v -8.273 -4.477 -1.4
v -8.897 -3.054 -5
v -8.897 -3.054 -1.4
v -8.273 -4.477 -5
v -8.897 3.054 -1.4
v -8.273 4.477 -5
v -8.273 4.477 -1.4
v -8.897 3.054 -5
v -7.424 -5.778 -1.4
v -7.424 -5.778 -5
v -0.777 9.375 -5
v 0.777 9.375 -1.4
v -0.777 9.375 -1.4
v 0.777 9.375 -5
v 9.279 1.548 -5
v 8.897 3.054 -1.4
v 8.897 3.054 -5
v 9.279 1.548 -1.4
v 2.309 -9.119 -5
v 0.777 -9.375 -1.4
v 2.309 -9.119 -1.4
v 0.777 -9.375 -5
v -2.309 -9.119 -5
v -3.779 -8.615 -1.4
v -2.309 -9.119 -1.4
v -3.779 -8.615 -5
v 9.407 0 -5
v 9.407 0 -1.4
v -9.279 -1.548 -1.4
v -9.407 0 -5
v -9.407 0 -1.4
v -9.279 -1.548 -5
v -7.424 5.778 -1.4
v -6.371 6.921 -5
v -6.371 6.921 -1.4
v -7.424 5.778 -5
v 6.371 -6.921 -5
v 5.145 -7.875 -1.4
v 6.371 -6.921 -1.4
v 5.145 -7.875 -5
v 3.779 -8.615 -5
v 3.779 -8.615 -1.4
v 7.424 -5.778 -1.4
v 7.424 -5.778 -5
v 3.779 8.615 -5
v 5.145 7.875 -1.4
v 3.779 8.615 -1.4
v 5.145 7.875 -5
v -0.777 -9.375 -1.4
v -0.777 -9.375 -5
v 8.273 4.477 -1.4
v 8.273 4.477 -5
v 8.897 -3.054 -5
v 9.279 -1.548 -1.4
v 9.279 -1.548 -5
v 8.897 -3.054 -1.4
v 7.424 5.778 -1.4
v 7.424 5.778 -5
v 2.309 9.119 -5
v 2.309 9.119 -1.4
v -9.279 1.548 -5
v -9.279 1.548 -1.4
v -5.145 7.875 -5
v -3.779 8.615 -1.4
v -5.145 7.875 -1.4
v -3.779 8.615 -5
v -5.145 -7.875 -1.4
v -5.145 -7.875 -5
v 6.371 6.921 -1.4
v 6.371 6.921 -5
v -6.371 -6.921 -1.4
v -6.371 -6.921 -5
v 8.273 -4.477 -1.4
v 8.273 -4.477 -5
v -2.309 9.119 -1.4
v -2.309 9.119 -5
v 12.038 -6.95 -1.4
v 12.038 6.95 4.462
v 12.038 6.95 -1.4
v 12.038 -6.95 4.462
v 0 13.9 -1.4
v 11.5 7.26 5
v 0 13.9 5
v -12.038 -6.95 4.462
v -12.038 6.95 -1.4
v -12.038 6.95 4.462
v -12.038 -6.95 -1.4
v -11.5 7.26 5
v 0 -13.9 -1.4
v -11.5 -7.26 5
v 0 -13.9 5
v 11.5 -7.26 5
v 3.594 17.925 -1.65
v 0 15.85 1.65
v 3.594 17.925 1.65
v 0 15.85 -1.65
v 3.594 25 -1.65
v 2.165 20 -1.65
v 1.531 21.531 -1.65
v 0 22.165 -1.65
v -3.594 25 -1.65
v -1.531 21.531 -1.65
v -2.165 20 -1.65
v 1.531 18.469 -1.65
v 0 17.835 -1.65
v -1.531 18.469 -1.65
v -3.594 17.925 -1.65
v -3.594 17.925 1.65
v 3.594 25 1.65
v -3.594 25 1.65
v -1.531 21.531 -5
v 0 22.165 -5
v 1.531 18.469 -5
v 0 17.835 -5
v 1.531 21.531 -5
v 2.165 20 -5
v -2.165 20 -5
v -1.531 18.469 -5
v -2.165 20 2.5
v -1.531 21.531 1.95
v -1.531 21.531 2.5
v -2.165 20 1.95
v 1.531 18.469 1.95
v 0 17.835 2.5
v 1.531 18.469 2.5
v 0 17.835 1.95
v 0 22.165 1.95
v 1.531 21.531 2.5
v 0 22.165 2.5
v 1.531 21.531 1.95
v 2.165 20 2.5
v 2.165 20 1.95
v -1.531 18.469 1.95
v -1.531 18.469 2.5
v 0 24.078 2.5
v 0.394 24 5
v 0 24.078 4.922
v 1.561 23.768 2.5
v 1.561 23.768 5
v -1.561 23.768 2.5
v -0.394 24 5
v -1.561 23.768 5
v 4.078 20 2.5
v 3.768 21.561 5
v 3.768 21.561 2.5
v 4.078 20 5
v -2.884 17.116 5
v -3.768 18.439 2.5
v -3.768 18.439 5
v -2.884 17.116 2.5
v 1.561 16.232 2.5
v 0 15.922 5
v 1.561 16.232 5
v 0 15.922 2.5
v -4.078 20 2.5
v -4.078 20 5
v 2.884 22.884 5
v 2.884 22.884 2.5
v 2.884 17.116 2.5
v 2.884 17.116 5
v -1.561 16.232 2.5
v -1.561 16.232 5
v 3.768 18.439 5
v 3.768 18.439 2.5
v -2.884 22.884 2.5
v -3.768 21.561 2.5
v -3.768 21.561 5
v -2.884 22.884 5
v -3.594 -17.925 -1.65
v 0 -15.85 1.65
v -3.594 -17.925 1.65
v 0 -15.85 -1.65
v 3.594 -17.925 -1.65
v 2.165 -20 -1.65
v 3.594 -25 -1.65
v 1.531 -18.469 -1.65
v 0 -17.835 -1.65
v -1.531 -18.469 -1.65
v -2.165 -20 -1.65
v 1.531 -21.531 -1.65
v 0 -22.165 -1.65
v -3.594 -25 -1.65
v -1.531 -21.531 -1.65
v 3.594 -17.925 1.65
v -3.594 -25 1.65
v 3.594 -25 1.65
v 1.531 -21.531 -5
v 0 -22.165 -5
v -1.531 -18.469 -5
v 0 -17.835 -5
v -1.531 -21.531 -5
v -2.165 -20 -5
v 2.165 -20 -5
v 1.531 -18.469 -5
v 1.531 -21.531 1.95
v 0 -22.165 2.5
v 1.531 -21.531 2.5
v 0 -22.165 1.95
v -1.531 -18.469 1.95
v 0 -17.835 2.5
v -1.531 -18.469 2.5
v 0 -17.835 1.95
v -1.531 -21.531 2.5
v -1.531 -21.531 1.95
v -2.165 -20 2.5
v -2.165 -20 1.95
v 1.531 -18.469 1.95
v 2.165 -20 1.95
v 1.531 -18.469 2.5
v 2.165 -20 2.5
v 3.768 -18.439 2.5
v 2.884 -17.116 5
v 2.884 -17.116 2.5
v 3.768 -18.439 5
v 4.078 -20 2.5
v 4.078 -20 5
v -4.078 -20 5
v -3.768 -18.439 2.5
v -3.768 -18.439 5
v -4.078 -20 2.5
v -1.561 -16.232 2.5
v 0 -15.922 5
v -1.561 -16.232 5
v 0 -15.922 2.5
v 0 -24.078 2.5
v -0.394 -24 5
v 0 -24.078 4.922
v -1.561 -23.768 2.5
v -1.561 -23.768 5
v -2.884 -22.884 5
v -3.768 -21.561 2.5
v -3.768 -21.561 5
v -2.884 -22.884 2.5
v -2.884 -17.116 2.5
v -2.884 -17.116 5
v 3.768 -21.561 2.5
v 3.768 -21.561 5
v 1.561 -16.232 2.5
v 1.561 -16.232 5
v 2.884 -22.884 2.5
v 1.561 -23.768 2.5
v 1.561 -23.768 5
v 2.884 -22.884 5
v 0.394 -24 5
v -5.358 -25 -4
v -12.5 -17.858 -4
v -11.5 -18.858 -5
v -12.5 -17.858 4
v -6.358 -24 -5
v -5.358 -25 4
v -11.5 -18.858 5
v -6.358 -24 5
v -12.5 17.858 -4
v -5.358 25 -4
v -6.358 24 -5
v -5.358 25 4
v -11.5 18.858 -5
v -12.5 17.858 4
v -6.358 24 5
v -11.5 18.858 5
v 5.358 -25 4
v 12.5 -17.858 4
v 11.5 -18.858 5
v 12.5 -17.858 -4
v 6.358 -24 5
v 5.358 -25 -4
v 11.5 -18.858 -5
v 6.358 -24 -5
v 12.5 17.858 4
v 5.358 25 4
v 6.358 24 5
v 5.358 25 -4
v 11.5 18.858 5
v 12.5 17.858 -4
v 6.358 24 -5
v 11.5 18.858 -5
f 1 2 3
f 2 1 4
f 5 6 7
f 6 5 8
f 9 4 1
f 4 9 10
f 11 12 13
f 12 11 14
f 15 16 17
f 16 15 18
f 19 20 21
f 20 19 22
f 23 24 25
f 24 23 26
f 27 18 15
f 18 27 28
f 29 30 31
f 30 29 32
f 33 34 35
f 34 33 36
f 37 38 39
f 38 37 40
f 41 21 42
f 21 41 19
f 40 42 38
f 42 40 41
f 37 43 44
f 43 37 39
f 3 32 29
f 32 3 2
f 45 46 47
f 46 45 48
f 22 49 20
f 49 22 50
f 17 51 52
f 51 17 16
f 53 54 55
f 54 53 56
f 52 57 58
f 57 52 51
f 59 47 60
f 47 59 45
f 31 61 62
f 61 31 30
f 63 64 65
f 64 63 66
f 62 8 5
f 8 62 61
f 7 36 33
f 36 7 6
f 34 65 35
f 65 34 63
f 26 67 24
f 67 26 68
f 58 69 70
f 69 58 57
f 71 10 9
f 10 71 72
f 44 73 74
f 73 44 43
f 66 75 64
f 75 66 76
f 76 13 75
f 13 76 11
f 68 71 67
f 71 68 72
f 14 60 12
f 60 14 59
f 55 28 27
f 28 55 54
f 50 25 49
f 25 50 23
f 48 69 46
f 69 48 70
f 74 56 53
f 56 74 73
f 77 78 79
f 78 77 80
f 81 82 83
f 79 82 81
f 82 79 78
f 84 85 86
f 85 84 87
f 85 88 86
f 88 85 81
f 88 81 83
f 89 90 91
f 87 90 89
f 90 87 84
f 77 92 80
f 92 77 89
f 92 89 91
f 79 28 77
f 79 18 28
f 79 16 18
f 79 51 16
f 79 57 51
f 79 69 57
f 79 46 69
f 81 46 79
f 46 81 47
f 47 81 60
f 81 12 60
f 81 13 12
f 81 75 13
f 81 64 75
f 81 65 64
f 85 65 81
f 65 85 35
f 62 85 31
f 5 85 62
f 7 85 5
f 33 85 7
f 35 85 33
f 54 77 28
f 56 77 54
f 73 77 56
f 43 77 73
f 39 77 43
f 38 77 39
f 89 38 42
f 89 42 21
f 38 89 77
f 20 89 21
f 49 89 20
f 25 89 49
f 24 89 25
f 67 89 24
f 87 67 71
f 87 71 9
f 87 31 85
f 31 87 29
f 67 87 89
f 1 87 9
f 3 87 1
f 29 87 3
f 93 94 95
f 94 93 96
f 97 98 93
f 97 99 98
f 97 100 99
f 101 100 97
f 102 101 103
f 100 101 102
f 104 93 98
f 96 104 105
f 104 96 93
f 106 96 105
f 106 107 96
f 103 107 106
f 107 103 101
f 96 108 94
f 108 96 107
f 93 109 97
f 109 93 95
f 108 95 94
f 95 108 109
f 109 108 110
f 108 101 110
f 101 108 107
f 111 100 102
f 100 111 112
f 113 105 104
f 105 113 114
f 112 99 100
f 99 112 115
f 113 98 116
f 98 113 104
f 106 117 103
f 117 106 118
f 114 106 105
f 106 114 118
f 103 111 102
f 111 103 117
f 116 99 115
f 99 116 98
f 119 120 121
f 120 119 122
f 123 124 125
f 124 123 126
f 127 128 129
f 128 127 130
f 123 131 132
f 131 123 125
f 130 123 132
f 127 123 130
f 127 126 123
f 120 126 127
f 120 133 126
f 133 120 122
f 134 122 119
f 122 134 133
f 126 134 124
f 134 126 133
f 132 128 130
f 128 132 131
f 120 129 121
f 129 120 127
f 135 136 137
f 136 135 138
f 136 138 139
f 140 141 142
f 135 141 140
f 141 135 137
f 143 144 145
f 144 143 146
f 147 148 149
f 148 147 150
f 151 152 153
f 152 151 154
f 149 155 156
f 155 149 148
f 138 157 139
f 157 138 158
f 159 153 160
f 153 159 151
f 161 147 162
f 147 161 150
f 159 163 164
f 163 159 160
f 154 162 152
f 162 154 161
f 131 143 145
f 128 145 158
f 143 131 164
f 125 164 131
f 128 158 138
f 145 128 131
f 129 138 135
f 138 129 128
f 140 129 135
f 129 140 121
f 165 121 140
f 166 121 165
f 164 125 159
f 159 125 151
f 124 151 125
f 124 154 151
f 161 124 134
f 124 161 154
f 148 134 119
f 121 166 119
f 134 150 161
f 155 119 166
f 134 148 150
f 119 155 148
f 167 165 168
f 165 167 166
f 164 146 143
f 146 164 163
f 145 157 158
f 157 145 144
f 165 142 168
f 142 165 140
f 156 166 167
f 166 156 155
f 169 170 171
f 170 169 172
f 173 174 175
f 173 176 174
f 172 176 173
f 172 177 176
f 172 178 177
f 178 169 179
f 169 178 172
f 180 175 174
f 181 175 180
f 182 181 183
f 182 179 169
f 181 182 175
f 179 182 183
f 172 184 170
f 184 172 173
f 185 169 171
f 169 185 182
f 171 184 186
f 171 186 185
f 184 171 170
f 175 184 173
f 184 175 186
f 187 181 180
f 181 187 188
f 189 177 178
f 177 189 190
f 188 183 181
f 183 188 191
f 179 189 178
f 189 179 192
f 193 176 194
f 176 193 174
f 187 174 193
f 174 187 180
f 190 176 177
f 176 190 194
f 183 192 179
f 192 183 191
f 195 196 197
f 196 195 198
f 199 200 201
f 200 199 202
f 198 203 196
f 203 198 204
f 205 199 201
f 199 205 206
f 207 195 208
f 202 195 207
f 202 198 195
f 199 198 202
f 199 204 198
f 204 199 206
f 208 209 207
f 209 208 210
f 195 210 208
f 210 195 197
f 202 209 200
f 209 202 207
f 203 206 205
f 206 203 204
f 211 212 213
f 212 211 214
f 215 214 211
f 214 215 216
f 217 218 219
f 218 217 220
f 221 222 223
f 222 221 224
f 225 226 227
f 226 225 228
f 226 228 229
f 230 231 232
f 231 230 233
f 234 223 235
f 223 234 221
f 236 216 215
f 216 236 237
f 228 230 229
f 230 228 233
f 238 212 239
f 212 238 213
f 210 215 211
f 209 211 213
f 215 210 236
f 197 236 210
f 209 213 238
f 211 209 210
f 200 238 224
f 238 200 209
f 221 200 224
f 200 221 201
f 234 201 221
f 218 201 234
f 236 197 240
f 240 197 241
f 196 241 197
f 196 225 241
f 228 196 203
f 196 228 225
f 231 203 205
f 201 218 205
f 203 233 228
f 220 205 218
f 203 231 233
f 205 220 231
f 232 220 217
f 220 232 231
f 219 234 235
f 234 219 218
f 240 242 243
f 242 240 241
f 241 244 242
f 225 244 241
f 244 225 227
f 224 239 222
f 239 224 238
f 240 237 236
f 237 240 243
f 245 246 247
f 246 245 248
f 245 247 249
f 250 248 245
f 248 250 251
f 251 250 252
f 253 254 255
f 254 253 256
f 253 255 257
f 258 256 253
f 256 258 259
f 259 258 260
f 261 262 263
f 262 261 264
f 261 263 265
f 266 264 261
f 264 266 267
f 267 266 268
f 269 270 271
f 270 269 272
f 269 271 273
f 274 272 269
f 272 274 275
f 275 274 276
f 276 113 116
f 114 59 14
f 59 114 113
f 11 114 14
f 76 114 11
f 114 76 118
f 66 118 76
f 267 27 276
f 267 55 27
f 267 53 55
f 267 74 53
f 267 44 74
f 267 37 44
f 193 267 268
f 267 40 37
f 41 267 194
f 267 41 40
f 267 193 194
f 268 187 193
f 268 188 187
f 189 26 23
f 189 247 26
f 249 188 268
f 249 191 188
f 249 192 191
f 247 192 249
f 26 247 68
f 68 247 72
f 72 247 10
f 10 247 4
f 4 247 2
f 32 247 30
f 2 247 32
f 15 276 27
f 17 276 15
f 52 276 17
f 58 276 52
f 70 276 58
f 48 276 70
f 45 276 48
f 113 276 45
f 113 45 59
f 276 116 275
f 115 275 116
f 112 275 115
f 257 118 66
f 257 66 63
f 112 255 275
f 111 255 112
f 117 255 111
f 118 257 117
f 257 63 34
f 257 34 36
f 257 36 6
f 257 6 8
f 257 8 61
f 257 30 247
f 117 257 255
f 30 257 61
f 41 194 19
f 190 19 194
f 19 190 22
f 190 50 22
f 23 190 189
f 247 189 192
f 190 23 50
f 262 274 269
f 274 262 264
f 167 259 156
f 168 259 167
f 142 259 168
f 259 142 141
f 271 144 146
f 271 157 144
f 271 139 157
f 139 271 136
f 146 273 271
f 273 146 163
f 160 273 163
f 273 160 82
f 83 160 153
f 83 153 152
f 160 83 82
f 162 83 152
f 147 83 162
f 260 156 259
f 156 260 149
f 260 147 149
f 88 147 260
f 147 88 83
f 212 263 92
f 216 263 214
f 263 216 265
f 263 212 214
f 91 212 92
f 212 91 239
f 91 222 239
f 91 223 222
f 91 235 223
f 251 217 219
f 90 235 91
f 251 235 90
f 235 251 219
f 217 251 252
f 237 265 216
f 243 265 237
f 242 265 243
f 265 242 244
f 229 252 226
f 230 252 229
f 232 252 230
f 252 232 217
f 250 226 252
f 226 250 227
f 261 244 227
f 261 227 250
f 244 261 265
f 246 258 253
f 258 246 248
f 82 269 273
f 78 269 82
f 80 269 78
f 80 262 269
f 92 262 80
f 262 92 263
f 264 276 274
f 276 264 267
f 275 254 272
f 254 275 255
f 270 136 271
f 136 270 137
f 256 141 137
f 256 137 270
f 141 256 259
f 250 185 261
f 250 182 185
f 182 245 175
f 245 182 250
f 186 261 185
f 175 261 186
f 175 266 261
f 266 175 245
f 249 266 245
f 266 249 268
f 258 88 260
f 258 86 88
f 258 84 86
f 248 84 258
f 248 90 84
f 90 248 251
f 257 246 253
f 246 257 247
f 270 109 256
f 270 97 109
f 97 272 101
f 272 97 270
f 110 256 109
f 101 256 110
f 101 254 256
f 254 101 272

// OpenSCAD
// file: fancy_cube.scad
module ccube(size, chamfer, sides=true)
{
    hull()
    {
        cube([size[0] - chamfer, size[1] - chamfer, size[2]], true);

        if (sides)
        {
            cube([size[0] - chamfer, size[1], size[2] - chamfer], true);
            cube([size[0], size[1] - chamfer, size[2] - chamfer], true);
        } else {
            cube([size[0], size[1], size[2] - chamfer], true);
        }
    }
}

module fcube(size, radius, sides=true)
{
    diameter = 2*radius;
    adjusted = [size[0] - diameter, size[1] - diameter, size[2] - diameter];
    offset = [adjusted[0]/2, adjusted[1]/2, adjusted[2]/2];

    ccube(size, diameter, sides);
    top_bottom_fillets(radius, adjusted, offset);

    if (sides)
    {
        side_fillets(radius, adjusted, offset);
    }
    else
    {
        corner_fillets(radius, size, offset);
    }
}

module top_bottom_fillets(radius, size, offset)
{
    for (y=[-1,1])
    {
        for (z=[-1,1])
        {
            translate([0, y*offset[1], z*offset[2]])
            {
                rotate([0, 90, 0])
                {
                    rotate([0, 0, 90])
                    {
                        cylinder(r=radius, h=size[0], center=true);
                    }
                }
            }
        }
    }

    for (x=[-1,1])
    {
        for (z=[-1,1])
        {
            translate([x*offset[0], 0, z*offset[2]])
            {
                rotate([90, 0, 0])
                {
                    cylinder(r=radius, h=size[1], center=true);
                }
            }
        }
    }
}

module corner_fillets(radius, size, offset)
{
    intersection()
    {
        for (y=[-1,1])
        {
            for (z=[-1,1])
            {
                translate([0, y*offset[1], z*offset[2]])
                {
                    rotate([0, 90, 0])
                    {
                        cylinder(r=radius, h=size[0], center=true);
                    }
                }
            }
        }

        for (x=[-1,1])
        {
            for (z=[-1,1])
            {
                translate([x*offset[0], 0, z*offset[2]])
                {
                    rotate([90, 0, 0])
                    {
                        cylinder(r=radius, h=size[1], center=true);
                    }
                }
            }
        }
    }
}

module side_fillets(radius, size, offset)
{
    for (x=[-1,1])
    {
        for (y=[-1,1])
        {
            translate([x*offset[0], y*offset[1], 0])
            {
                cylinder(r=radius, h=size[2], center=true);
            }
        }
    }

    for (x=[-1,1])
    {
        for (y=[-1,1])
        {
            for (z=[-1,1])
            {
                translate([x*offset[0], y*offset[1], z*offset[2]])
                {
                    sphere(r=radius, center=true);
                }
            }
        }
    }
}
// file: nuttrap.scad
include <MCAD/nuts_and_bolts.scad>

module nutTrap(size, offset, tolerance = +0.0001)
{
    radius = METRIC_NUT_AC_WIDTHS[size]/2+tolerance;
	height = METRIC_NUT_THICKNESS[size]+tolerance;
    apothem = radius*sin(60);

    translate([0, 0, -height/2])
    {
        hull()
        {
            translate([offset, -apothem, 0])
            {
        		cube([0.1, 2*apothem, height]);
        	}

            cylinder(r=radius, h=height, $fn = 6);
        }
    }
}

module nutTrapTest(size, offset, tolerance = +0.0001)
{
    height = 2*(METRIC_NUT_THICKNESS[size]+tolerance);
    width = 2*offset;

    difference()
    {
        cube([width, width, height], true);
        translate([0, 0, 0])
        {
            nutTrap(size, offset, tolerance);
        }
    }
}

nutTrapTest(3, 6);
// file: config.scad
// modules
module_body_size = [25, 50, 10];
module_mount_edge_offset = 5;
module_level_bolt_size = 4;
module_level_spring_diameter = 8;
module_level_bolt_spacing = module_body_size[1] - 2*module_mount_edge_offset;
module_clamp_bolt_size = 4;
module_clamp_bolt_head_height = 3.5;

// main body
body_wall_thickness = 5;
body_size = [2*module_body_size[0]+2*body_wall_thickness+1, module_body_size[1]+2*body_wall_thickness+1, 55];
carriage_mount_hole_spacing=22.5;	// i3 rework standard
carriage_screw_size = 4;
carriage_screw_head_height = 2.5;
hotend_fan_output = 49;
hotend_fan_screw_spacing = 40;
hotend_fan_screw_size = 4;
blower_screw_spacing = 40;
blower_screw_size = 4;

// misc
body_chamfer = 2;
layer_height = 0.3;
tolerance = 0.1;
pf = 0.1;  // preview fix for z-buffer tearing on cuts
// main file
use <MCAD/polyholes.scad>
include <MCAD/nuts_and_bolts.scad>
include <config.scad>
use <nuttrap.scad>
use <fancy_cube.scad>

sensor_diameter = 18.75;
sensor_nut_height = 6.5;

main();

module main()
{
    difference()
    {
        ccube(module_body_size, body_chamfer, true);
        sensor_cutout();
        leveling_hardware_cutout();
        corner_cutout();
    }
}

module sensor_cutout()
{
    cut_size = module_body_size[2] + pf;
    translate([0, 0, -cut_size/2])
    {
        polyhole(cut_size, sensor_diameter);
    }
    
    nut_offset = module_body_size[2]/2 + sensor_nut_height/2 - sensor_nut_height + pf;
    translate([0, 0, nut_offset])
    {
        rotate([0, 0, 90])
        {
            cylinder(h=sensor_nut_height, d=METRIC_NUT_AC_WIDTHS[16]+tolerance, $fn=6, center=true);
        }
    }
}

module leveling_hardware_cutout()
{
    cut_length = module_body_size[2] + pf;
    cut_offset = module_body_size[1]/2 - module_mount_edge_offset;
    rotate([0, 0, 90])
    {
        for(y=[0:1])
        {
            rotate([0, 0, y*180])
            {
                translate([cut_offset, 0, 0])
                {
                    nutTrap(module_clamp_bolt_size, module_mount_edge_offset, tolerance);
                }
                
                translate([cut_offset, 0, -cut_length/2])
                {
                    polyhole(cut_length/2, module_clamp_bolt_size);
                }
                
                translate([cut_offset, 0, METRIC_NUT_THICKNESS[module_clamp_bolt_size]/2 + pf/2 + layer_height])
                {
                    polyhole(cut_length/2, module_clamp_bolt_size);
                }
                
                translate([cut_offset, 0, module_body_size[2]/4])
                {
                    polyhole(module_body_size[2]/4 + pf, module_level_spring_diameter);
                }
            }
        }
    }
}

module corner_cutout()
{
    for (x=[-1:2:1])
	{
		for (y=[-1:2:1])
		{
			x_offset = module_body_size[0]/2 * x;
			y_offset = module_body_size[1]/2 * y;
			translate([x_offset, y_offset, 0])
			{
				rotate([0, 0, 45])
				{
                    cube([module_body_size[0]/2.5 + pf, module_body_size[0]/2.5 + pf, module_body_size[2]+pf], true);
                }
			}
		}
	}
}
